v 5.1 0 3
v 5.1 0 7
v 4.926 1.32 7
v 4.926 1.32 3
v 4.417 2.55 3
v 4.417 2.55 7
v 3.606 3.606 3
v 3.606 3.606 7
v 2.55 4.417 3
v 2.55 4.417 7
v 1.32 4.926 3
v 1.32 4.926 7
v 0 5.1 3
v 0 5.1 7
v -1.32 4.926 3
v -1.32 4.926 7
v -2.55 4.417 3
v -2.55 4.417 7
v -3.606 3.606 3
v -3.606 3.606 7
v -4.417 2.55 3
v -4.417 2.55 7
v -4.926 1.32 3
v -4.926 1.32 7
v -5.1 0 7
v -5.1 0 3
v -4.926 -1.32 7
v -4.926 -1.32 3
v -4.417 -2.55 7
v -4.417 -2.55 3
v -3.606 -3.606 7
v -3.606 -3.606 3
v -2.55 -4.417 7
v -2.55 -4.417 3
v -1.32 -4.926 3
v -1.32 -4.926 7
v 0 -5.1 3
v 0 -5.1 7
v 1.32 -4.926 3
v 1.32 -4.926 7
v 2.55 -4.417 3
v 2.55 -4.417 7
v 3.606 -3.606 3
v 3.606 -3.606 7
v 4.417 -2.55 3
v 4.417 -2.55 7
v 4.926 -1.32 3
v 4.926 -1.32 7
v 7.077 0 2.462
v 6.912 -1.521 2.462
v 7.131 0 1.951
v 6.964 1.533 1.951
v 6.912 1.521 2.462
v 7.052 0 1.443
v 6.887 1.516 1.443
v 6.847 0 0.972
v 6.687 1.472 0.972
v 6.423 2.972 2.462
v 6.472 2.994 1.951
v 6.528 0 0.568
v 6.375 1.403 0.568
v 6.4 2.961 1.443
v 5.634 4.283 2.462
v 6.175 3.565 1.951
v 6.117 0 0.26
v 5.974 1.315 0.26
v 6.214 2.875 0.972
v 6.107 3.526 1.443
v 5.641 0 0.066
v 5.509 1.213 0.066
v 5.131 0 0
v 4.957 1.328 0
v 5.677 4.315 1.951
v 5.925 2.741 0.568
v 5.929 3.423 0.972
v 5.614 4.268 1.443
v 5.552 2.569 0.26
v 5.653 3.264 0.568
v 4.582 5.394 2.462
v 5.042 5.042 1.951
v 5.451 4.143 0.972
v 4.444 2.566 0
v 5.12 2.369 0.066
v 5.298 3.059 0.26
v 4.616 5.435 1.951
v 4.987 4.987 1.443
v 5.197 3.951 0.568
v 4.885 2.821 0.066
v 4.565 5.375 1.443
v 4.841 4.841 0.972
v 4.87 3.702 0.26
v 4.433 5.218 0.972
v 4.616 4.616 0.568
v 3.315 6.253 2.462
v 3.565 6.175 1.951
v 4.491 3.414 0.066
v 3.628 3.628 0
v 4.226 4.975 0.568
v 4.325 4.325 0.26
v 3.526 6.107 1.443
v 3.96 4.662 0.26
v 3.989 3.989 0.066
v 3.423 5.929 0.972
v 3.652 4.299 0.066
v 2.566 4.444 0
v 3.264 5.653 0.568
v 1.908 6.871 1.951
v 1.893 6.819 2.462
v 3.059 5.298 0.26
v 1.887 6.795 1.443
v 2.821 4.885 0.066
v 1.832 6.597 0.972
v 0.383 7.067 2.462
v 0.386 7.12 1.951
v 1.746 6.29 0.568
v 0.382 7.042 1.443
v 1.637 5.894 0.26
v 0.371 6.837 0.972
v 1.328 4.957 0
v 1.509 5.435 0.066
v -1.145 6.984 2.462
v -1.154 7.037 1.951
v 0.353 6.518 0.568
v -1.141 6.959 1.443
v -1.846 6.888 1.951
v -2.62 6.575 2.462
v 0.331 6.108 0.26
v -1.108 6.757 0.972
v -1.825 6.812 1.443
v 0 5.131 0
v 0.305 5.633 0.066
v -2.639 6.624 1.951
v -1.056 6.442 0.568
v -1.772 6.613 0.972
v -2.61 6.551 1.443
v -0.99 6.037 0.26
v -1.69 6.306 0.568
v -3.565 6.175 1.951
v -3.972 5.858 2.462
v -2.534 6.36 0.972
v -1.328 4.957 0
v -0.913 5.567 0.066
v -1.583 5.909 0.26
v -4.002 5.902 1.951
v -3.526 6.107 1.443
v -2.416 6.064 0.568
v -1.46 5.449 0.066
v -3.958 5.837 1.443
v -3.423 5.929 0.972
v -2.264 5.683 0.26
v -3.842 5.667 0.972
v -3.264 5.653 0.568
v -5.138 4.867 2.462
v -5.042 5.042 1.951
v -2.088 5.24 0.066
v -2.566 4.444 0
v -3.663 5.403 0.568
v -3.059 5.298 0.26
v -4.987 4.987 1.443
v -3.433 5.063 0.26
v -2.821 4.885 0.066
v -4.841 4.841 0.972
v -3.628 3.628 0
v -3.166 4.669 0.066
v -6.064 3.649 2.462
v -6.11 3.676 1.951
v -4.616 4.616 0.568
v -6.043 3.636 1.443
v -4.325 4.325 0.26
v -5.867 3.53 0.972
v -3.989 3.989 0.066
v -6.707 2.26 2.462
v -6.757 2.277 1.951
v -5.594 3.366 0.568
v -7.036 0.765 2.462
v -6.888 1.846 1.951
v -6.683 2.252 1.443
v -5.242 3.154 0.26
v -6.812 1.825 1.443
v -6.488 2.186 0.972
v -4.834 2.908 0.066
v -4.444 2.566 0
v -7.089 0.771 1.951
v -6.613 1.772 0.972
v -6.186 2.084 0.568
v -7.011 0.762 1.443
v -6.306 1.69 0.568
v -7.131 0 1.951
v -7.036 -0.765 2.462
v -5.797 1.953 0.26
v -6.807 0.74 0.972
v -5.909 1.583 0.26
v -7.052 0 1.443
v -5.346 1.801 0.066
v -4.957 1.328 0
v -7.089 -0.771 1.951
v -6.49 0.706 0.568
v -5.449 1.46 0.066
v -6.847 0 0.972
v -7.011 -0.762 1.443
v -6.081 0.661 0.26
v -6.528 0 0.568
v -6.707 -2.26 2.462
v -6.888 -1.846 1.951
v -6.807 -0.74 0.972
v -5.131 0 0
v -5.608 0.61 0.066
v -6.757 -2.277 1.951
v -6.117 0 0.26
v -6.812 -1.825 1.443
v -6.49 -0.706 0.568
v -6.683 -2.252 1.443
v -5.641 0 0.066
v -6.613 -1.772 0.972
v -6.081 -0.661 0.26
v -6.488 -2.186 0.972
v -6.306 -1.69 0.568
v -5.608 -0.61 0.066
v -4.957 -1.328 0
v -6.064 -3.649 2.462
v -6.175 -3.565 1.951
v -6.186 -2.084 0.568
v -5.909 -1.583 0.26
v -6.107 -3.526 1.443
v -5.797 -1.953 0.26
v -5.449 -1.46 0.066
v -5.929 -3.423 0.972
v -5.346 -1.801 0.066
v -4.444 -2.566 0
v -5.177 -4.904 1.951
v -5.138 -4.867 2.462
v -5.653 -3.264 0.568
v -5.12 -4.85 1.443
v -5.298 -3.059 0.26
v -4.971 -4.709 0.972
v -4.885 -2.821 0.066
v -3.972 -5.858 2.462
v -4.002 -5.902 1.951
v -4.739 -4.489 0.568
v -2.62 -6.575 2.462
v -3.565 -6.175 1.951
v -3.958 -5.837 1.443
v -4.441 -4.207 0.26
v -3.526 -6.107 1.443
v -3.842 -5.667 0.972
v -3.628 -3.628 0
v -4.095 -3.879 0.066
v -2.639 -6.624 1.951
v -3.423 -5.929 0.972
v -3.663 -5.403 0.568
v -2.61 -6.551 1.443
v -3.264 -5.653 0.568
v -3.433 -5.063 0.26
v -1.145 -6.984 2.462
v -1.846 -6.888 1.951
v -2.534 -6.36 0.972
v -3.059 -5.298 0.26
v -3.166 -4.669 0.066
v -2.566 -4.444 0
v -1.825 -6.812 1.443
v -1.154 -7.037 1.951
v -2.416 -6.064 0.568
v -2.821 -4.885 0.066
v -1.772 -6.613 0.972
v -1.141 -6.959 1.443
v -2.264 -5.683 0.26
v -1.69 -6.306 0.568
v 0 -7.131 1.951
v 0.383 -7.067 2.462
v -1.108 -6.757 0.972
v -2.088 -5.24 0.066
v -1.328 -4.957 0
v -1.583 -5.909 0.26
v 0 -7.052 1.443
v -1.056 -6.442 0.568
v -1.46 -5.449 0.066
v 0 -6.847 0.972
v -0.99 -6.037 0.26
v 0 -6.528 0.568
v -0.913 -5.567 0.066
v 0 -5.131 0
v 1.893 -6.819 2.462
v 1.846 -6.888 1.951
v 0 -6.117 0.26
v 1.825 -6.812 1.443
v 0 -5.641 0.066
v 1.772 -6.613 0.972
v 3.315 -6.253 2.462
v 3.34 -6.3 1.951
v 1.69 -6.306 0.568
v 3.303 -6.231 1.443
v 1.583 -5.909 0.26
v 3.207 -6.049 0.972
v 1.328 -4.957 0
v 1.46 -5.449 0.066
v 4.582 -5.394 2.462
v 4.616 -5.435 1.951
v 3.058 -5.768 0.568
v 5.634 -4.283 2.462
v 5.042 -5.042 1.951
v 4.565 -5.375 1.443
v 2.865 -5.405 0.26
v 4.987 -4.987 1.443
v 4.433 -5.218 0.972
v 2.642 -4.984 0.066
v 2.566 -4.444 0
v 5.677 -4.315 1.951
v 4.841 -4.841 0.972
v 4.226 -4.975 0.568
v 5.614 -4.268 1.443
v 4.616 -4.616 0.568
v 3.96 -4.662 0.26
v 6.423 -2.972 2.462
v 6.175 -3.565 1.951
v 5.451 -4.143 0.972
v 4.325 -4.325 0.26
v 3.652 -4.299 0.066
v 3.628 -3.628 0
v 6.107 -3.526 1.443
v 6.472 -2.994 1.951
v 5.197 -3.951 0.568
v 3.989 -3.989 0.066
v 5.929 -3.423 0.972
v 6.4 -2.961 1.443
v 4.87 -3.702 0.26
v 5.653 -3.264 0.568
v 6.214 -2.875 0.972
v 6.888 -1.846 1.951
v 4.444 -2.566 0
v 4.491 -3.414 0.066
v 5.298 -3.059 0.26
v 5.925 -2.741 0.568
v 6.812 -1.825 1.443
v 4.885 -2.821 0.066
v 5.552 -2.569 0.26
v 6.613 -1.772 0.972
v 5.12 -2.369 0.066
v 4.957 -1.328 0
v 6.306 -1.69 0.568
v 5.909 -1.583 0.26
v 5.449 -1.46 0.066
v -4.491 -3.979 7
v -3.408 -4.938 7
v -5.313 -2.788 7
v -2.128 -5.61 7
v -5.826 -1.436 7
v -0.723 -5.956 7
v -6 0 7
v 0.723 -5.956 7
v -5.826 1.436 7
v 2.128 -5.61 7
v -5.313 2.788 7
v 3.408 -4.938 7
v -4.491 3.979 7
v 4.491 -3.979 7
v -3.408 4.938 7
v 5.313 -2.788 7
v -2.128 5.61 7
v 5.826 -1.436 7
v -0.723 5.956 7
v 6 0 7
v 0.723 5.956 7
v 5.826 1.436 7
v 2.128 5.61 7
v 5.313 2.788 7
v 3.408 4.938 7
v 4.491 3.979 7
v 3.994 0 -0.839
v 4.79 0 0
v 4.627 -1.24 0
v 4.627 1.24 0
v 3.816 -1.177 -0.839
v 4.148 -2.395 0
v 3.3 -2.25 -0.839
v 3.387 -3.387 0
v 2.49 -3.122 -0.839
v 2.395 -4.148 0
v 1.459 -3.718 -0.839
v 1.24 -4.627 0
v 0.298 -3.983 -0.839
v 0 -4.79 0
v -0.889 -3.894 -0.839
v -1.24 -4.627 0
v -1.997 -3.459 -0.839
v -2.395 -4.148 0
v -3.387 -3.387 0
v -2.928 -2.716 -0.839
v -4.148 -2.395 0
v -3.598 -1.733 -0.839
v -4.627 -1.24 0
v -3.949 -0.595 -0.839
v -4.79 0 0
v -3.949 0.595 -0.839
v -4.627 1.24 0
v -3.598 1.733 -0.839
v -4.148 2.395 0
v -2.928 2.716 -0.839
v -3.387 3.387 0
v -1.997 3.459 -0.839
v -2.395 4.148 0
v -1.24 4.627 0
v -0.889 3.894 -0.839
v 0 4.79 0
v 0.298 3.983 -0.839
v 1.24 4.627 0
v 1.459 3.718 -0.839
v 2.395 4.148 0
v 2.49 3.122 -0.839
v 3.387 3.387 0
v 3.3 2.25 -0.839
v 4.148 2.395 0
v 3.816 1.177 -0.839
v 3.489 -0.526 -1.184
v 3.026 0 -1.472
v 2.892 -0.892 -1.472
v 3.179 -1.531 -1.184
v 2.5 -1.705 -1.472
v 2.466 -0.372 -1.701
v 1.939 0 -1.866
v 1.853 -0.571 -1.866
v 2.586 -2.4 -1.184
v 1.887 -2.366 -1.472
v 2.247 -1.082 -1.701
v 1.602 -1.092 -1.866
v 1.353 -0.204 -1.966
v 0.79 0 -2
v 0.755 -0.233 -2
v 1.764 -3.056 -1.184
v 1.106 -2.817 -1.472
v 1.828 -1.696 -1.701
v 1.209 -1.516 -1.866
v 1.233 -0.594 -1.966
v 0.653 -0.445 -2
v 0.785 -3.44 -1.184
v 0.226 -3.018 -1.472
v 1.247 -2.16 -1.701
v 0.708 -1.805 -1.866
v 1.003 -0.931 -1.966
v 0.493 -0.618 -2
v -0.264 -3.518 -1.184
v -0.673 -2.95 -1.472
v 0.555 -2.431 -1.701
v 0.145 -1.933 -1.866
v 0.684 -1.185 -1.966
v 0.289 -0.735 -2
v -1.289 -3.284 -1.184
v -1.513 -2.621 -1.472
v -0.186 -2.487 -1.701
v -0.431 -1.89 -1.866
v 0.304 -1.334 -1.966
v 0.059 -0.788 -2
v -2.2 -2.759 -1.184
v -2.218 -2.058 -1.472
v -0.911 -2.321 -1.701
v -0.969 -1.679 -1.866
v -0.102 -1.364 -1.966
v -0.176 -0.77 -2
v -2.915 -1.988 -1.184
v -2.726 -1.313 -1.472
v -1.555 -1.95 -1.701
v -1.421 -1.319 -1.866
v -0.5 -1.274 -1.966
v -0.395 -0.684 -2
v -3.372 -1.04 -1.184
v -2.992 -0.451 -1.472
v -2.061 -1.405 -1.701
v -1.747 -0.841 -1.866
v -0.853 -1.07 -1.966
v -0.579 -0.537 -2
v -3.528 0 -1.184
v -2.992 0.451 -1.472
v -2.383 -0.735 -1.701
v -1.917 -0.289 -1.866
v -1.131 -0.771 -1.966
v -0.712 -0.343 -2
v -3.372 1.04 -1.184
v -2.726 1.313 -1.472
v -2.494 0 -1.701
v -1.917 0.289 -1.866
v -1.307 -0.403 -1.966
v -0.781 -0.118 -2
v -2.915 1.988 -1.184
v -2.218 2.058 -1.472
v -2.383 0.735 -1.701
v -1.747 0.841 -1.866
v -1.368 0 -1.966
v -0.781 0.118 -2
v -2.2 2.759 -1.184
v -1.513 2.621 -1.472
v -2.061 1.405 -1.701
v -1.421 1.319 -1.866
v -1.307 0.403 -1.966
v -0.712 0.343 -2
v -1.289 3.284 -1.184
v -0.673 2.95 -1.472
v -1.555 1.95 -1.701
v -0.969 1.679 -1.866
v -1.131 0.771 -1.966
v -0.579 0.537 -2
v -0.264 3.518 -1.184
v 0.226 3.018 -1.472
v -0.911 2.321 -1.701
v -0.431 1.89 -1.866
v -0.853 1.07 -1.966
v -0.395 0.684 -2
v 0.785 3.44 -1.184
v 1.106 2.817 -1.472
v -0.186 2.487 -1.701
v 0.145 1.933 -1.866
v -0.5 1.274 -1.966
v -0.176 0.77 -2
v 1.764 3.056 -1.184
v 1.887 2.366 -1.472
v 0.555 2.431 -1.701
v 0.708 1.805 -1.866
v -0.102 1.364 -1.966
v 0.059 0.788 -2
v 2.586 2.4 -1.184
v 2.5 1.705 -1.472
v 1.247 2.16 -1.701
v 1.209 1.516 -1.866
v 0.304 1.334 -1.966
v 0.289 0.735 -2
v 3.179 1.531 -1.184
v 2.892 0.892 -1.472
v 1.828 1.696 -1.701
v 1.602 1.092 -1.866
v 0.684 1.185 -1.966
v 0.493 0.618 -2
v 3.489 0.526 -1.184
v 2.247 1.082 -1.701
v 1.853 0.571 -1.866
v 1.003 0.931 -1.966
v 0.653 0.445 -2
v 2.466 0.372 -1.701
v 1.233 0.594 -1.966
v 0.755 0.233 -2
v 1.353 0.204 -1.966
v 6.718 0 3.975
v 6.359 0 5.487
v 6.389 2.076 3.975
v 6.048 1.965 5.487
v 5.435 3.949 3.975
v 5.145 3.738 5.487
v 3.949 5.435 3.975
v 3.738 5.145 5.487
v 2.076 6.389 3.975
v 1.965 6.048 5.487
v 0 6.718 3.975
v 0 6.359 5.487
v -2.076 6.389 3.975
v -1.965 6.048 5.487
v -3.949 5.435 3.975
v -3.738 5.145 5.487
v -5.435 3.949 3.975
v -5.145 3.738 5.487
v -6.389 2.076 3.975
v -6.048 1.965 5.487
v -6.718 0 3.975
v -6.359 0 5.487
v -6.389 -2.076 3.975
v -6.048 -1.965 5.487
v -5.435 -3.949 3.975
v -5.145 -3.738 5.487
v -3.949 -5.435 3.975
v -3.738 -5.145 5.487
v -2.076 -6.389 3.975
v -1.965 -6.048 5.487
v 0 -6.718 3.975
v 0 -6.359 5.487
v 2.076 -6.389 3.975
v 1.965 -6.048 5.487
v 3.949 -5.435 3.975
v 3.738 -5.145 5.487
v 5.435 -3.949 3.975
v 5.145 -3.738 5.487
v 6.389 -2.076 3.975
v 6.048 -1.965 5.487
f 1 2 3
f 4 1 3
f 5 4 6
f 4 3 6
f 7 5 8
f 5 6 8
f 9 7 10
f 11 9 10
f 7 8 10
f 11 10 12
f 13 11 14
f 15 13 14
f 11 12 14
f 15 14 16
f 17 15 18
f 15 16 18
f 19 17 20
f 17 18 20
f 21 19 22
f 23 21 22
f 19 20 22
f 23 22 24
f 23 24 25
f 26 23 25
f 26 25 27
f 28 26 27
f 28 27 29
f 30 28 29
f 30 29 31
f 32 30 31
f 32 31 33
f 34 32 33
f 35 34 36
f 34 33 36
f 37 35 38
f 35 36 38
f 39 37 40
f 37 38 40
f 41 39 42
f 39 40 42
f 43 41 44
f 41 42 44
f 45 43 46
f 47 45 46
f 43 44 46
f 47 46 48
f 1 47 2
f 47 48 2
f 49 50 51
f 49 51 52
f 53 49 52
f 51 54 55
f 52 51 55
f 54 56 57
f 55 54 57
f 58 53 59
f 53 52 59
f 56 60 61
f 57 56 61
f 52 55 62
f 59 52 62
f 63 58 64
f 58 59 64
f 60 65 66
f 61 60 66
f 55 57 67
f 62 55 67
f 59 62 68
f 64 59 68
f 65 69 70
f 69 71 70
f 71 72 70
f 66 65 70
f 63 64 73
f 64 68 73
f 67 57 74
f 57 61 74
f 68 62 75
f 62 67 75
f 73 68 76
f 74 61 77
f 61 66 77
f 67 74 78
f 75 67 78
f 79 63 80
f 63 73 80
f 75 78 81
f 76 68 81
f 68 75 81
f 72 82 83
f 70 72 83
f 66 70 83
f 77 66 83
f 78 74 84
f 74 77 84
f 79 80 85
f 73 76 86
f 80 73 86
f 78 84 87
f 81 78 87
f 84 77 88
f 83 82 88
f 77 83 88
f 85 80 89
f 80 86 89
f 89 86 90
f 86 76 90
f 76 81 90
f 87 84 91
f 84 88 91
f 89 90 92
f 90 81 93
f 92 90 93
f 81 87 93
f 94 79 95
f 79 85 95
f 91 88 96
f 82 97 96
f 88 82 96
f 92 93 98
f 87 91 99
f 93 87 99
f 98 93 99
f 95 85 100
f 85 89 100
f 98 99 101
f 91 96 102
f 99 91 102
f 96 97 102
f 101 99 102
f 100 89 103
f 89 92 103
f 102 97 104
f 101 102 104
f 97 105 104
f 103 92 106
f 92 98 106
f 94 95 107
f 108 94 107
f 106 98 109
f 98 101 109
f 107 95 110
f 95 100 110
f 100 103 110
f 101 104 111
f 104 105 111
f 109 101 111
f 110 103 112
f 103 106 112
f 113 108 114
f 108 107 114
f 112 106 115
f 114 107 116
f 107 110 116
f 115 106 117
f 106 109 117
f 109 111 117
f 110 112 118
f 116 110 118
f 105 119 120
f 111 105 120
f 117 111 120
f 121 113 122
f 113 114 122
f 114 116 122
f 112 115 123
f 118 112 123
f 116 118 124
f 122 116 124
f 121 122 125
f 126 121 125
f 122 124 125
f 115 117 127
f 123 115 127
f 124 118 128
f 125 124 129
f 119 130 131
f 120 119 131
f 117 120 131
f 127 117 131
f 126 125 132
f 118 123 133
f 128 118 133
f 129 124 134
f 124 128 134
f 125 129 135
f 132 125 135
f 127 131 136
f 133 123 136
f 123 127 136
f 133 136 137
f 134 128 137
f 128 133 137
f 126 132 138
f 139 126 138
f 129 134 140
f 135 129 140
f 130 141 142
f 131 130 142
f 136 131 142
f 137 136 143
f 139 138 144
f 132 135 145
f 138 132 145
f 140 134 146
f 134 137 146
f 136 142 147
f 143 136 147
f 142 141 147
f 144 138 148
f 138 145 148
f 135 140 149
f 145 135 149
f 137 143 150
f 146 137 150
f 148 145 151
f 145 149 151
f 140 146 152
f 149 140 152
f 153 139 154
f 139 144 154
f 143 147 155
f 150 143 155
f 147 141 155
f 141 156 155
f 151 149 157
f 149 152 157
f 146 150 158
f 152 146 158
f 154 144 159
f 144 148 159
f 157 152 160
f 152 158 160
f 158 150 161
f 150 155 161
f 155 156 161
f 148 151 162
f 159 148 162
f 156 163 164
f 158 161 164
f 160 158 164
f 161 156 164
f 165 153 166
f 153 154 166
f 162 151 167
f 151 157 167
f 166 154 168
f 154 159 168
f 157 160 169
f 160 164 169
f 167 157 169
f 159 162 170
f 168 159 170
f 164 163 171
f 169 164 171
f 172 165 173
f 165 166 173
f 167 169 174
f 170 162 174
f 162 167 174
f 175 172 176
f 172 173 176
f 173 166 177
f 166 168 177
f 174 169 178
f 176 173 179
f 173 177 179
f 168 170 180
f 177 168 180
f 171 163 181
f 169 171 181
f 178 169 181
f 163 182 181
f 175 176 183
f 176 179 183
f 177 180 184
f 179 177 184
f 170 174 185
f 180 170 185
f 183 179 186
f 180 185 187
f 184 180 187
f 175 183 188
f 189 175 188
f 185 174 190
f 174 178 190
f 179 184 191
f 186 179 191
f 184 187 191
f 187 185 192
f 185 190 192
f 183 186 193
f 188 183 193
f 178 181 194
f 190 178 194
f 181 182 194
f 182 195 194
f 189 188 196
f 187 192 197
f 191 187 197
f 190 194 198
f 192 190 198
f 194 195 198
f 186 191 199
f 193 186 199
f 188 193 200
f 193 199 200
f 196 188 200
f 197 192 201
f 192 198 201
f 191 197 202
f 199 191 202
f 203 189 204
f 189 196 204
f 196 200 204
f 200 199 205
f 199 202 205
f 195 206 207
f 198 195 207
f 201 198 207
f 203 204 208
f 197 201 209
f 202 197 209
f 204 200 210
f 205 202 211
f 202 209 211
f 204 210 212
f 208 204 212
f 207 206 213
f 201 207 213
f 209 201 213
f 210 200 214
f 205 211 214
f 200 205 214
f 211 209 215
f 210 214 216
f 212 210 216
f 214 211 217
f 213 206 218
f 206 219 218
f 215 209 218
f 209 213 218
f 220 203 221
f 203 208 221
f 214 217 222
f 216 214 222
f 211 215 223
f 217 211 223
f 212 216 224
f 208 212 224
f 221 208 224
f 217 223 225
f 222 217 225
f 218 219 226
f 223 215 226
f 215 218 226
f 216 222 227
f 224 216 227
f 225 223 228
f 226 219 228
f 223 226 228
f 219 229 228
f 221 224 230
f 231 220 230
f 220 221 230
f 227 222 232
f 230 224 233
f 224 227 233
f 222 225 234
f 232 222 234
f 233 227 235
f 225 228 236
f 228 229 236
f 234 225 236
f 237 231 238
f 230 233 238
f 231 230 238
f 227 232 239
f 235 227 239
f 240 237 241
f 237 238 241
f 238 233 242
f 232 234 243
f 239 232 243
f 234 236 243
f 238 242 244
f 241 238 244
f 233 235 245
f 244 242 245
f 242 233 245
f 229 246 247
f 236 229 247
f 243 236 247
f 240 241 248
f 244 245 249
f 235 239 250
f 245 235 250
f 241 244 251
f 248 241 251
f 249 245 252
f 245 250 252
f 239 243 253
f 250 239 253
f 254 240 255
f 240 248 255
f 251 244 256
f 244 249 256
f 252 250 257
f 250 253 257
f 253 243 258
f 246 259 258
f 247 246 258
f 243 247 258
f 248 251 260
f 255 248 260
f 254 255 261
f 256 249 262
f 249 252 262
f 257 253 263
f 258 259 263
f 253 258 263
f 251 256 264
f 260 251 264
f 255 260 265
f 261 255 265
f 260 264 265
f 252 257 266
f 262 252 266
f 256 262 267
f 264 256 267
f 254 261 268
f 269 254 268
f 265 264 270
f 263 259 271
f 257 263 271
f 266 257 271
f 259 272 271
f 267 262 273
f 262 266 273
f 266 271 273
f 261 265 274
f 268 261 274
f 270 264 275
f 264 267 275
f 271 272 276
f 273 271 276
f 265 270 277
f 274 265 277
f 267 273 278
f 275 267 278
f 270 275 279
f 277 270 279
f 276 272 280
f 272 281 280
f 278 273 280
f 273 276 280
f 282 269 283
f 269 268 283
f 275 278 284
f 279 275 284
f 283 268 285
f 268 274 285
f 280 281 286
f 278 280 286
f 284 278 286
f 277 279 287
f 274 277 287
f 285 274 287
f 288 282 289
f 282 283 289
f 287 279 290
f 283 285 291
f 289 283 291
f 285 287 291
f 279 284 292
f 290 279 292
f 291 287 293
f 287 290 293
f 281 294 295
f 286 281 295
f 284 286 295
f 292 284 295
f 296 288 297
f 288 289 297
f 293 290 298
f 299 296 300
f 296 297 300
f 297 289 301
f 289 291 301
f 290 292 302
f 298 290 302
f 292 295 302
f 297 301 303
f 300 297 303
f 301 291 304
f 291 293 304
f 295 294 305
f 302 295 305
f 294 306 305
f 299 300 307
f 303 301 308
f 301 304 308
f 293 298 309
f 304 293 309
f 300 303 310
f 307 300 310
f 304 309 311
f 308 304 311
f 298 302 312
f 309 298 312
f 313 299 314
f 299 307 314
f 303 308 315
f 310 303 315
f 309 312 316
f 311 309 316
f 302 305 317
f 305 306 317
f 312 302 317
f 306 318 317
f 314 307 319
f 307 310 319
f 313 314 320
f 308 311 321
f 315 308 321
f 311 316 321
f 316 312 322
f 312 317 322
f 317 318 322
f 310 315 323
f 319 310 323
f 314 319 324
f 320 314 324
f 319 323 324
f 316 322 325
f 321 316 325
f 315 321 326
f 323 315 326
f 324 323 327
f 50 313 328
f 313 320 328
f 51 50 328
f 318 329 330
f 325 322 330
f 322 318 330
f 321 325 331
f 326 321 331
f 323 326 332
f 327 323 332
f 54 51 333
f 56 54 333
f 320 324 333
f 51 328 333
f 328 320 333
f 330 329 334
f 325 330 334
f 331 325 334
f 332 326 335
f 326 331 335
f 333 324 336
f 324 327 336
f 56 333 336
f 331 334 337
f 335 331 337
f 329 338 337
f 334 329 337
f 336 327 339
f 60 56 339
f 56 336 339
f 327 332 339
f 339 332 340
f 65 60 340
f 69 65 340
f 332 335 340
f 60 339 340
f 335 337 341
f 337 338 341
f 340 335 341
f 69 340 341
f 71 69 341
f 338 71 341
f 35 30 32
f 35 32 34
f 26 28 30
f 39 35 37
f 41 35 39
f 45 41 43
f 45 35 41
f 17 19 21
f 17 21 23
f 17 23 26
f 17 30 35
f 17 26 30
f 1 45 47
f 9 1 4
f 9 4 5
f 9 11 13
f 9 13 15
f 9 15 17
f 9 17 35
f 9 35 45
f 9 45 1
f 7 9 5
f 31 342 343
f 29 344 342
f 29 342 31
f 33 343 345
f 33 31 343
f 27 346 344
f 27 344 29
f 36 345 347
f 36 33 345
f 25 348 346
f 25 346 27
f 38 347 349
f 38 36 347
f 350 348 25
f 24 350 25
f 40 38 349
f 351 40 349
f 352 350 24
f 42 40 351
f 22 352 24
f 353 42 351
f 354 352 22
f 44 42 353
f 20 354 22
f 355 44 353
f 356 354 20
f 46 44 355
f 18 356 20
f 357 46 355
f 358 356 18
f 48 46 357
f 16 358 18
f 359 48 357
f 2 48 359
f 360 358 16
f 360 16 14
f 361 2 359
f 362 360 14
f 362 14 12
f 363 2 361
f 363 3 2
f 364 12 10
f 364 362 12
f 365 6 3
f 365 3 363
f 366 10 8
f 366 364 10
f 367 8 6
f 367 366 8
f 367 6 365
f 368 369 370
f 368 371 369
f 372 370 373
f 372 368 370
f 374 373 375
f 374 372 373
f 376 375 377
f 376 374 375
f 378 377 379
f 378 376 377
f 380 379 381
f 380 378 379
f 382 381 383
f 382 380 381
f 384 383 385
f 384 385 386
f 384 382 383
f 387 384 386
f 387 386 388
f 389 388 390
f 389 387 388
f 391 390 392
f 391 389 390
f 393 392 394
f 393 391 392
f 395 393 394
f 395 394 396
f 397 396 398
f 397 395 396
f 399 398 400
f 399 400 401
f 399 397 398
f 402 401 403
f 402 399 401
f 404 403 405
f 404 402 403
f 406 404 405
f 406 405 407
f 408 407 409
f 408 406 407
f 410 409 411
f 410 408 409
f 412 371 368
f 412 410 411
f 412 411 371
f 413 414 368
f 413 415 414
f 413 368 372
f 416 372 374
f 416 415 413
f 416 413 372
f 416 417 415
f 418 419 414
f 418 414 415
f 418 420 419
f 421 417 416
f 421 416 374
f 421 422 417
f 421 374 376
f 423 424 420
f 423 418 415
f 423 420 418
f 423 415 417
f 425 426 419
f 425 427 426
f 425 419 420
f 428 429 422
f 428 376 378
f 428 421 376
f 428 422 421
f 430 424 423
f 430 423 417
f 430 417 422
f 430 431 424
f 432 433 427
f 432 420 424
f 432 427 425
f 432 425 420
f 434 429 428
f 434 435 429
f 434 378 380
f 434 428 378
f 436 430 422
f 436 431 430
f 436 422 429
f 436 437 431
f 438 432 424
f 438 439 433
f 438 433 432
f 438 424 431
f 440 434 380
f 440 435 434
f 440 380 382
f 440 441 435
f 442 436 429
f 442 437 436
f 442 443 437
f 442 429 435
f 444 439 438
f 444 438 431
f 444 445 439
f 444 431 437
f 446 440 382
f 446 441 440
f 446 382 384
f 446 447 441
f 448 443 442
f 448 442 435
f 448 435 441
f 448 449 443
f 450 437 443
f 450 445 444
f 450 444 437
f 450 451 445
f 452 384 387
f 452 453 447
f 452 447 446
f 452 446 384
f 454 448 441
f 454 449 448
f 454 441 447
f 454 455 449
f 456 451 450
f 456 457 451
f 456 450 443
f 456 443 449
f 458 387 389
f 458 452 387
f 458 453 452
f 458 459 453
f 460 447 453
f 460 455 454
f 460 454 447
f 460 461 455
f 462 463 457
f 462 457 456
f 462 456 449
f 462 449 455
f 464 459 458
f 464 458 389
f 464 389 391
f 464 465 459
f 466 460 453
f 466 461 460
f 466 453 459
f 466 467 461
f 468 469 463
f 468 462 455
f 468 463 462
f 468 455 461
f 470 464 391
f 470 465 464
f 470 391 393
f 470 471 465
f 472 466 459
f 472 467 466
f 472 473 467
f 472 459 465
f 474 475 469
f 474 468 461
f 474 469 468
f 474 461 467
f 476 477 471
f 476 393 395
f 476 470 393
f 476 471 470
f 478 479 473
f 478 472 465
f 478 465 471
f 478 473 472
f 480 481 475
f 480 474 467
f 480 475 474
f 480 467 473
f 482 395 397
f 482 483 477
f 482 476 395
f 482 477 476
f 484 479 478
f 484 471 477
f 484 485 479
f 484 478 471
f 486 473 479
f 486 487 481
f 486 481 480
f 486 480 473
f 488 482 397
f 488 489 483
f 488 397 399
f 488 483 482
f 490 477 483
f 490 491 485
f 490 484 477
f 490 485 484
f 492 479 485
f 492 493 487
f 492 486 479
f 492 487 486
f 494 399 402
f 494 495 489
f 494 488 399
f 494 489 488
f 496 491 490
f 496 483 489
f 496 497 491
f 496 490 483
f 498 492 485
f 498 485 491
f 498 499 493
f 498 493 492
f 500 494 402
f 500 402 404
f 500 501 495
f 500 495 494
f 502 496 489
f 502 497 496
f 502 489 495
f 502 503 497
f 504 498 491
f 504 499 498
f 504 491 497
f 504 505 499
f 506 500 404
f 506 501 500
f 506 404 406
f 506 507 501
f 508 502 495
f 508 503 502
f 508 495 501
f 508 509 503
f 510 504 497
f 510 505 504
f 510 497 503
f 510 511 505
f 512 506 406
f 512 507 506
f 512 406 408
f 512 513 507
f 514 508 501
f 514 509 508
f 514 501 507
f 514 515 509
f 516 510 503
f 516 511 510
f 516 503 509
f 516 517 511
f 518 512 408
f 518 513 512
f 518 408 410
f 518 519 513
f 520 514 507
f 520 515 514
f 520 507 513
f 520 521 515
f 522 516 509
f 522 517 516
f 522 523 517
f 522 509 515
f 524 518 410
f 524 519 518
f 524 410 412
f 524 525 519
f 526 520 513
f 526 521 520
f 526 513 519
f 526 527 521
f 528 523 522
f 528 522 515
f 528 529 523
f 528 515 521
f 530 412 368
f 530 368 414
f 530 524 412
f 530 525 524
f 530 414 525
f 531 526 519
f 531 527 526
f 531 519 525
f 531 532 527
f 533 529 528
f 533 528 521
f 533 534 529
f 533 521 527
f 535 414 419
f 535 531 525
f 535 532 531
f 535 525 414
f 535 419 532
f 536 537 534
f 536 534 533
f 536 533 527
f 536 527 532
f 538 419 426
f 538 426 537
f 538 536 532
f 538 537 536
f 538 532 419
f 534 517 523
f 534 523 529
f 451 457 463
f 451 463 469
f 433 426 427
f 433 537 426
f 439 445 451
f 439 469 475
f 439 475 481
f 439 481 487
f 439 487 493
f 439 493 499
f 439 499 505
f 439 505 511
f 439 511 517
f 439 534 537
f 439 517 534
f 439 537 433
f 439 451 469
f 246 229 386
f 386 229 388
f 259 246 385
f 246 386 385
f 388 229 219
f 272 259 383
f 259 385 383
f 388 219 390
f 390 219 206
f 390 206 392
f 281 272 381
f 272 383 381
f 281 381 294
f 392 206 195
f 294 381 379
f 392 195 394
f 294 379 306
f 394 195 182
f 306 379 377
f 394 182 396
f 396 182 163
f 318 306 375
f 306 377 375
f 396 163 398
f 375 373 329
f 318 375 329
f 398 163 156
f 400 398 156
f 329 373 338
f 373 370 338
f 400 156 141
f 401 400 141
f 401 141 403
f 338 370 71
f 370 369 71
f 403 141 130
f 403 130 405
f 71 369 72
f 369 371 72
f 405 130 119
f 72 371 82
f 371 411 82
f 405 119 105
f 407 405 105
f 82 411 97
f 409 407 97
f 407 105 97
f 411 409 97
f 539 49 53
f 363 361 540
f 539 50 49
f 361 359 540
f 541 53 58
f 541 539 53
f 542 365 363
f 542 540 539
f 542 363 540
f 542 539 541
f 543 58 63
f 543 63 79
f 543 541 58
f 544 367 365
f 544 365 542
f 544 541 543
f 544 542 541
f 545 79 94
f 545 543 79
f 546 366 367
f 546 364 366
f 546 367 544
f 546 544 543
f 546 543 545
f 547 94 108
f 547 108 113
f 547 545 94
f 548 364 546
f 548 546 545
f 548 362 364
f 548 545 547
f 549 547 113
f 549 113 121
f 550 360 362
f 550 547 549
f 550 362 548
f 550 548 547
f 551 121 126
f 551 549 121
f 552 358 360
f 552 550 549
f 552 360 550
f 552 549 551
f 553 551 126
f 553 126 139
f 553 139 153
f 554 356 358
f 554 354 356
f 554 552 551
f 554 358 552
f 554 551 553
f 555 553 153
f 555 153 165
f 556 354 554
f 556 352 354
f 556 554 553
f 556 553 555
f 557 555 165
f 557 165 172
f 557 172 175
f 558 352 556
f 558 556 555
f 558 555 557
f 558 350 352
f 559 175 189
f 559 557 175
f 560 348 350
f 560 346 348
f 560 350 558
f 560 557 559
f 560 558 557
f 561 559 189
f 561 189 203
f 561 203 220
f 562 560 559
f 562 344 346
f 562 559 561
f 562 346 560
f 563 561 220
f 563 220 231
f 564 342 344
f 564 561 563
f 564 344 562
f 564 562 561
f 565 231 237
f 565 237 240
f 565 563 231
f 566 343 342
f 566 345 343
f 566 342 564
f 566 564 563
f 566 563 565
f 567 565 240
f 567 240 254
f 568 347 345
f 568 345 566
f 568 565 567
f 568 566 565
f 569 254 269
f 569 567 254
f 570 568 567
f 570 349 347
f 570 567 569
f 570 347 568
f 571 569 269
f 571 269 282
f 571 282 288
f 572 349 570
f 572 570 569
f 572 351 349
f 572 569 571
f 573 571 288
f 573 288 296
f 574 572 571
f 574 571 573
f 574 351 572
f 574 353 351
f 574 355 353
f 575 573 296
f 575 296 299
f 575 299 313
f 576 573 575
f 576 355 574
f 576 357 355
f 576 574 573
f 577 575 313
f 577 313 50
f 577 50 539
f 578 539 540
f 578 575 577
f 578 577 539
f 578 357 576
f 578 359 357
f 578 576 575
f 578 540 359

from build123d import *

# Parameters (mm, degrees)
F0_R     = 7.6617406775
F2_R     = 6
F4_R     = 2
F5_R     = 4.7899887375
F6_DEPTH = 2
F8_R     = 5.1
F9_DEPTH = 4


# Not quite as in the source:
# - a fillet or chamfer that OpenCascade refuses, or shapes differently, is made with other operations: its cross-section is extruded or revolved along the edge and cut away or added


with BuildPart() as f3:
    # F0 (on Top) → F3 section 0
    with BuildSketch(Plane.XY):
        Circle(F0_R)
    # F2 (on offset) → F3 section 1
    with BuildSketch(Plane.XY.offset(7)):
        Circle(F2_R)
    loft()

    # F4
    f4_edges = [f3.edges().sort_by_distance(p)[0] for p in [
        (-7.661741, 0, 0),
    ]]
    fillet(f4_edges, radius=F4_R)

    # F5 (on face) → F6 (join)
    with BuildSketch(Plane(origin=(0, 0, 0), x_dir=(1, 0, 0), z_dir=(0, 0, -1))):
        Circle(F5_R)
    extrude(amount=F6_DEPTH)

    # F7: fillet of radius 5 on 1 edges, made by hand

    # F7_s1 → F7_t2 (revolve, cut)
    with BuildSketch(Plane.XZ):
        with BuildLine():
            ThreePointArc((4.7899887375, 0), (3.026056715, -1.472135955), (0.7899887375, -2))
            Line((0.7899887375, -2), (4.7899887375, -2))
            Line((4.7899887375, -2), (4.7899887375, 0))
        make_face()
    revolve(axis=Axis((0, 0, -2), (0, 0, -1)), mode=Mode.SUBTRACT)

    # F8 (on face) → F9 (cut)
    with BuildSketch(Plane.XY.offset(7)):
        Circle(F8_R)
    extrude(amount=-F9_DEPTH, mode=Mode.SUBTRACT)


solid = f3.part
